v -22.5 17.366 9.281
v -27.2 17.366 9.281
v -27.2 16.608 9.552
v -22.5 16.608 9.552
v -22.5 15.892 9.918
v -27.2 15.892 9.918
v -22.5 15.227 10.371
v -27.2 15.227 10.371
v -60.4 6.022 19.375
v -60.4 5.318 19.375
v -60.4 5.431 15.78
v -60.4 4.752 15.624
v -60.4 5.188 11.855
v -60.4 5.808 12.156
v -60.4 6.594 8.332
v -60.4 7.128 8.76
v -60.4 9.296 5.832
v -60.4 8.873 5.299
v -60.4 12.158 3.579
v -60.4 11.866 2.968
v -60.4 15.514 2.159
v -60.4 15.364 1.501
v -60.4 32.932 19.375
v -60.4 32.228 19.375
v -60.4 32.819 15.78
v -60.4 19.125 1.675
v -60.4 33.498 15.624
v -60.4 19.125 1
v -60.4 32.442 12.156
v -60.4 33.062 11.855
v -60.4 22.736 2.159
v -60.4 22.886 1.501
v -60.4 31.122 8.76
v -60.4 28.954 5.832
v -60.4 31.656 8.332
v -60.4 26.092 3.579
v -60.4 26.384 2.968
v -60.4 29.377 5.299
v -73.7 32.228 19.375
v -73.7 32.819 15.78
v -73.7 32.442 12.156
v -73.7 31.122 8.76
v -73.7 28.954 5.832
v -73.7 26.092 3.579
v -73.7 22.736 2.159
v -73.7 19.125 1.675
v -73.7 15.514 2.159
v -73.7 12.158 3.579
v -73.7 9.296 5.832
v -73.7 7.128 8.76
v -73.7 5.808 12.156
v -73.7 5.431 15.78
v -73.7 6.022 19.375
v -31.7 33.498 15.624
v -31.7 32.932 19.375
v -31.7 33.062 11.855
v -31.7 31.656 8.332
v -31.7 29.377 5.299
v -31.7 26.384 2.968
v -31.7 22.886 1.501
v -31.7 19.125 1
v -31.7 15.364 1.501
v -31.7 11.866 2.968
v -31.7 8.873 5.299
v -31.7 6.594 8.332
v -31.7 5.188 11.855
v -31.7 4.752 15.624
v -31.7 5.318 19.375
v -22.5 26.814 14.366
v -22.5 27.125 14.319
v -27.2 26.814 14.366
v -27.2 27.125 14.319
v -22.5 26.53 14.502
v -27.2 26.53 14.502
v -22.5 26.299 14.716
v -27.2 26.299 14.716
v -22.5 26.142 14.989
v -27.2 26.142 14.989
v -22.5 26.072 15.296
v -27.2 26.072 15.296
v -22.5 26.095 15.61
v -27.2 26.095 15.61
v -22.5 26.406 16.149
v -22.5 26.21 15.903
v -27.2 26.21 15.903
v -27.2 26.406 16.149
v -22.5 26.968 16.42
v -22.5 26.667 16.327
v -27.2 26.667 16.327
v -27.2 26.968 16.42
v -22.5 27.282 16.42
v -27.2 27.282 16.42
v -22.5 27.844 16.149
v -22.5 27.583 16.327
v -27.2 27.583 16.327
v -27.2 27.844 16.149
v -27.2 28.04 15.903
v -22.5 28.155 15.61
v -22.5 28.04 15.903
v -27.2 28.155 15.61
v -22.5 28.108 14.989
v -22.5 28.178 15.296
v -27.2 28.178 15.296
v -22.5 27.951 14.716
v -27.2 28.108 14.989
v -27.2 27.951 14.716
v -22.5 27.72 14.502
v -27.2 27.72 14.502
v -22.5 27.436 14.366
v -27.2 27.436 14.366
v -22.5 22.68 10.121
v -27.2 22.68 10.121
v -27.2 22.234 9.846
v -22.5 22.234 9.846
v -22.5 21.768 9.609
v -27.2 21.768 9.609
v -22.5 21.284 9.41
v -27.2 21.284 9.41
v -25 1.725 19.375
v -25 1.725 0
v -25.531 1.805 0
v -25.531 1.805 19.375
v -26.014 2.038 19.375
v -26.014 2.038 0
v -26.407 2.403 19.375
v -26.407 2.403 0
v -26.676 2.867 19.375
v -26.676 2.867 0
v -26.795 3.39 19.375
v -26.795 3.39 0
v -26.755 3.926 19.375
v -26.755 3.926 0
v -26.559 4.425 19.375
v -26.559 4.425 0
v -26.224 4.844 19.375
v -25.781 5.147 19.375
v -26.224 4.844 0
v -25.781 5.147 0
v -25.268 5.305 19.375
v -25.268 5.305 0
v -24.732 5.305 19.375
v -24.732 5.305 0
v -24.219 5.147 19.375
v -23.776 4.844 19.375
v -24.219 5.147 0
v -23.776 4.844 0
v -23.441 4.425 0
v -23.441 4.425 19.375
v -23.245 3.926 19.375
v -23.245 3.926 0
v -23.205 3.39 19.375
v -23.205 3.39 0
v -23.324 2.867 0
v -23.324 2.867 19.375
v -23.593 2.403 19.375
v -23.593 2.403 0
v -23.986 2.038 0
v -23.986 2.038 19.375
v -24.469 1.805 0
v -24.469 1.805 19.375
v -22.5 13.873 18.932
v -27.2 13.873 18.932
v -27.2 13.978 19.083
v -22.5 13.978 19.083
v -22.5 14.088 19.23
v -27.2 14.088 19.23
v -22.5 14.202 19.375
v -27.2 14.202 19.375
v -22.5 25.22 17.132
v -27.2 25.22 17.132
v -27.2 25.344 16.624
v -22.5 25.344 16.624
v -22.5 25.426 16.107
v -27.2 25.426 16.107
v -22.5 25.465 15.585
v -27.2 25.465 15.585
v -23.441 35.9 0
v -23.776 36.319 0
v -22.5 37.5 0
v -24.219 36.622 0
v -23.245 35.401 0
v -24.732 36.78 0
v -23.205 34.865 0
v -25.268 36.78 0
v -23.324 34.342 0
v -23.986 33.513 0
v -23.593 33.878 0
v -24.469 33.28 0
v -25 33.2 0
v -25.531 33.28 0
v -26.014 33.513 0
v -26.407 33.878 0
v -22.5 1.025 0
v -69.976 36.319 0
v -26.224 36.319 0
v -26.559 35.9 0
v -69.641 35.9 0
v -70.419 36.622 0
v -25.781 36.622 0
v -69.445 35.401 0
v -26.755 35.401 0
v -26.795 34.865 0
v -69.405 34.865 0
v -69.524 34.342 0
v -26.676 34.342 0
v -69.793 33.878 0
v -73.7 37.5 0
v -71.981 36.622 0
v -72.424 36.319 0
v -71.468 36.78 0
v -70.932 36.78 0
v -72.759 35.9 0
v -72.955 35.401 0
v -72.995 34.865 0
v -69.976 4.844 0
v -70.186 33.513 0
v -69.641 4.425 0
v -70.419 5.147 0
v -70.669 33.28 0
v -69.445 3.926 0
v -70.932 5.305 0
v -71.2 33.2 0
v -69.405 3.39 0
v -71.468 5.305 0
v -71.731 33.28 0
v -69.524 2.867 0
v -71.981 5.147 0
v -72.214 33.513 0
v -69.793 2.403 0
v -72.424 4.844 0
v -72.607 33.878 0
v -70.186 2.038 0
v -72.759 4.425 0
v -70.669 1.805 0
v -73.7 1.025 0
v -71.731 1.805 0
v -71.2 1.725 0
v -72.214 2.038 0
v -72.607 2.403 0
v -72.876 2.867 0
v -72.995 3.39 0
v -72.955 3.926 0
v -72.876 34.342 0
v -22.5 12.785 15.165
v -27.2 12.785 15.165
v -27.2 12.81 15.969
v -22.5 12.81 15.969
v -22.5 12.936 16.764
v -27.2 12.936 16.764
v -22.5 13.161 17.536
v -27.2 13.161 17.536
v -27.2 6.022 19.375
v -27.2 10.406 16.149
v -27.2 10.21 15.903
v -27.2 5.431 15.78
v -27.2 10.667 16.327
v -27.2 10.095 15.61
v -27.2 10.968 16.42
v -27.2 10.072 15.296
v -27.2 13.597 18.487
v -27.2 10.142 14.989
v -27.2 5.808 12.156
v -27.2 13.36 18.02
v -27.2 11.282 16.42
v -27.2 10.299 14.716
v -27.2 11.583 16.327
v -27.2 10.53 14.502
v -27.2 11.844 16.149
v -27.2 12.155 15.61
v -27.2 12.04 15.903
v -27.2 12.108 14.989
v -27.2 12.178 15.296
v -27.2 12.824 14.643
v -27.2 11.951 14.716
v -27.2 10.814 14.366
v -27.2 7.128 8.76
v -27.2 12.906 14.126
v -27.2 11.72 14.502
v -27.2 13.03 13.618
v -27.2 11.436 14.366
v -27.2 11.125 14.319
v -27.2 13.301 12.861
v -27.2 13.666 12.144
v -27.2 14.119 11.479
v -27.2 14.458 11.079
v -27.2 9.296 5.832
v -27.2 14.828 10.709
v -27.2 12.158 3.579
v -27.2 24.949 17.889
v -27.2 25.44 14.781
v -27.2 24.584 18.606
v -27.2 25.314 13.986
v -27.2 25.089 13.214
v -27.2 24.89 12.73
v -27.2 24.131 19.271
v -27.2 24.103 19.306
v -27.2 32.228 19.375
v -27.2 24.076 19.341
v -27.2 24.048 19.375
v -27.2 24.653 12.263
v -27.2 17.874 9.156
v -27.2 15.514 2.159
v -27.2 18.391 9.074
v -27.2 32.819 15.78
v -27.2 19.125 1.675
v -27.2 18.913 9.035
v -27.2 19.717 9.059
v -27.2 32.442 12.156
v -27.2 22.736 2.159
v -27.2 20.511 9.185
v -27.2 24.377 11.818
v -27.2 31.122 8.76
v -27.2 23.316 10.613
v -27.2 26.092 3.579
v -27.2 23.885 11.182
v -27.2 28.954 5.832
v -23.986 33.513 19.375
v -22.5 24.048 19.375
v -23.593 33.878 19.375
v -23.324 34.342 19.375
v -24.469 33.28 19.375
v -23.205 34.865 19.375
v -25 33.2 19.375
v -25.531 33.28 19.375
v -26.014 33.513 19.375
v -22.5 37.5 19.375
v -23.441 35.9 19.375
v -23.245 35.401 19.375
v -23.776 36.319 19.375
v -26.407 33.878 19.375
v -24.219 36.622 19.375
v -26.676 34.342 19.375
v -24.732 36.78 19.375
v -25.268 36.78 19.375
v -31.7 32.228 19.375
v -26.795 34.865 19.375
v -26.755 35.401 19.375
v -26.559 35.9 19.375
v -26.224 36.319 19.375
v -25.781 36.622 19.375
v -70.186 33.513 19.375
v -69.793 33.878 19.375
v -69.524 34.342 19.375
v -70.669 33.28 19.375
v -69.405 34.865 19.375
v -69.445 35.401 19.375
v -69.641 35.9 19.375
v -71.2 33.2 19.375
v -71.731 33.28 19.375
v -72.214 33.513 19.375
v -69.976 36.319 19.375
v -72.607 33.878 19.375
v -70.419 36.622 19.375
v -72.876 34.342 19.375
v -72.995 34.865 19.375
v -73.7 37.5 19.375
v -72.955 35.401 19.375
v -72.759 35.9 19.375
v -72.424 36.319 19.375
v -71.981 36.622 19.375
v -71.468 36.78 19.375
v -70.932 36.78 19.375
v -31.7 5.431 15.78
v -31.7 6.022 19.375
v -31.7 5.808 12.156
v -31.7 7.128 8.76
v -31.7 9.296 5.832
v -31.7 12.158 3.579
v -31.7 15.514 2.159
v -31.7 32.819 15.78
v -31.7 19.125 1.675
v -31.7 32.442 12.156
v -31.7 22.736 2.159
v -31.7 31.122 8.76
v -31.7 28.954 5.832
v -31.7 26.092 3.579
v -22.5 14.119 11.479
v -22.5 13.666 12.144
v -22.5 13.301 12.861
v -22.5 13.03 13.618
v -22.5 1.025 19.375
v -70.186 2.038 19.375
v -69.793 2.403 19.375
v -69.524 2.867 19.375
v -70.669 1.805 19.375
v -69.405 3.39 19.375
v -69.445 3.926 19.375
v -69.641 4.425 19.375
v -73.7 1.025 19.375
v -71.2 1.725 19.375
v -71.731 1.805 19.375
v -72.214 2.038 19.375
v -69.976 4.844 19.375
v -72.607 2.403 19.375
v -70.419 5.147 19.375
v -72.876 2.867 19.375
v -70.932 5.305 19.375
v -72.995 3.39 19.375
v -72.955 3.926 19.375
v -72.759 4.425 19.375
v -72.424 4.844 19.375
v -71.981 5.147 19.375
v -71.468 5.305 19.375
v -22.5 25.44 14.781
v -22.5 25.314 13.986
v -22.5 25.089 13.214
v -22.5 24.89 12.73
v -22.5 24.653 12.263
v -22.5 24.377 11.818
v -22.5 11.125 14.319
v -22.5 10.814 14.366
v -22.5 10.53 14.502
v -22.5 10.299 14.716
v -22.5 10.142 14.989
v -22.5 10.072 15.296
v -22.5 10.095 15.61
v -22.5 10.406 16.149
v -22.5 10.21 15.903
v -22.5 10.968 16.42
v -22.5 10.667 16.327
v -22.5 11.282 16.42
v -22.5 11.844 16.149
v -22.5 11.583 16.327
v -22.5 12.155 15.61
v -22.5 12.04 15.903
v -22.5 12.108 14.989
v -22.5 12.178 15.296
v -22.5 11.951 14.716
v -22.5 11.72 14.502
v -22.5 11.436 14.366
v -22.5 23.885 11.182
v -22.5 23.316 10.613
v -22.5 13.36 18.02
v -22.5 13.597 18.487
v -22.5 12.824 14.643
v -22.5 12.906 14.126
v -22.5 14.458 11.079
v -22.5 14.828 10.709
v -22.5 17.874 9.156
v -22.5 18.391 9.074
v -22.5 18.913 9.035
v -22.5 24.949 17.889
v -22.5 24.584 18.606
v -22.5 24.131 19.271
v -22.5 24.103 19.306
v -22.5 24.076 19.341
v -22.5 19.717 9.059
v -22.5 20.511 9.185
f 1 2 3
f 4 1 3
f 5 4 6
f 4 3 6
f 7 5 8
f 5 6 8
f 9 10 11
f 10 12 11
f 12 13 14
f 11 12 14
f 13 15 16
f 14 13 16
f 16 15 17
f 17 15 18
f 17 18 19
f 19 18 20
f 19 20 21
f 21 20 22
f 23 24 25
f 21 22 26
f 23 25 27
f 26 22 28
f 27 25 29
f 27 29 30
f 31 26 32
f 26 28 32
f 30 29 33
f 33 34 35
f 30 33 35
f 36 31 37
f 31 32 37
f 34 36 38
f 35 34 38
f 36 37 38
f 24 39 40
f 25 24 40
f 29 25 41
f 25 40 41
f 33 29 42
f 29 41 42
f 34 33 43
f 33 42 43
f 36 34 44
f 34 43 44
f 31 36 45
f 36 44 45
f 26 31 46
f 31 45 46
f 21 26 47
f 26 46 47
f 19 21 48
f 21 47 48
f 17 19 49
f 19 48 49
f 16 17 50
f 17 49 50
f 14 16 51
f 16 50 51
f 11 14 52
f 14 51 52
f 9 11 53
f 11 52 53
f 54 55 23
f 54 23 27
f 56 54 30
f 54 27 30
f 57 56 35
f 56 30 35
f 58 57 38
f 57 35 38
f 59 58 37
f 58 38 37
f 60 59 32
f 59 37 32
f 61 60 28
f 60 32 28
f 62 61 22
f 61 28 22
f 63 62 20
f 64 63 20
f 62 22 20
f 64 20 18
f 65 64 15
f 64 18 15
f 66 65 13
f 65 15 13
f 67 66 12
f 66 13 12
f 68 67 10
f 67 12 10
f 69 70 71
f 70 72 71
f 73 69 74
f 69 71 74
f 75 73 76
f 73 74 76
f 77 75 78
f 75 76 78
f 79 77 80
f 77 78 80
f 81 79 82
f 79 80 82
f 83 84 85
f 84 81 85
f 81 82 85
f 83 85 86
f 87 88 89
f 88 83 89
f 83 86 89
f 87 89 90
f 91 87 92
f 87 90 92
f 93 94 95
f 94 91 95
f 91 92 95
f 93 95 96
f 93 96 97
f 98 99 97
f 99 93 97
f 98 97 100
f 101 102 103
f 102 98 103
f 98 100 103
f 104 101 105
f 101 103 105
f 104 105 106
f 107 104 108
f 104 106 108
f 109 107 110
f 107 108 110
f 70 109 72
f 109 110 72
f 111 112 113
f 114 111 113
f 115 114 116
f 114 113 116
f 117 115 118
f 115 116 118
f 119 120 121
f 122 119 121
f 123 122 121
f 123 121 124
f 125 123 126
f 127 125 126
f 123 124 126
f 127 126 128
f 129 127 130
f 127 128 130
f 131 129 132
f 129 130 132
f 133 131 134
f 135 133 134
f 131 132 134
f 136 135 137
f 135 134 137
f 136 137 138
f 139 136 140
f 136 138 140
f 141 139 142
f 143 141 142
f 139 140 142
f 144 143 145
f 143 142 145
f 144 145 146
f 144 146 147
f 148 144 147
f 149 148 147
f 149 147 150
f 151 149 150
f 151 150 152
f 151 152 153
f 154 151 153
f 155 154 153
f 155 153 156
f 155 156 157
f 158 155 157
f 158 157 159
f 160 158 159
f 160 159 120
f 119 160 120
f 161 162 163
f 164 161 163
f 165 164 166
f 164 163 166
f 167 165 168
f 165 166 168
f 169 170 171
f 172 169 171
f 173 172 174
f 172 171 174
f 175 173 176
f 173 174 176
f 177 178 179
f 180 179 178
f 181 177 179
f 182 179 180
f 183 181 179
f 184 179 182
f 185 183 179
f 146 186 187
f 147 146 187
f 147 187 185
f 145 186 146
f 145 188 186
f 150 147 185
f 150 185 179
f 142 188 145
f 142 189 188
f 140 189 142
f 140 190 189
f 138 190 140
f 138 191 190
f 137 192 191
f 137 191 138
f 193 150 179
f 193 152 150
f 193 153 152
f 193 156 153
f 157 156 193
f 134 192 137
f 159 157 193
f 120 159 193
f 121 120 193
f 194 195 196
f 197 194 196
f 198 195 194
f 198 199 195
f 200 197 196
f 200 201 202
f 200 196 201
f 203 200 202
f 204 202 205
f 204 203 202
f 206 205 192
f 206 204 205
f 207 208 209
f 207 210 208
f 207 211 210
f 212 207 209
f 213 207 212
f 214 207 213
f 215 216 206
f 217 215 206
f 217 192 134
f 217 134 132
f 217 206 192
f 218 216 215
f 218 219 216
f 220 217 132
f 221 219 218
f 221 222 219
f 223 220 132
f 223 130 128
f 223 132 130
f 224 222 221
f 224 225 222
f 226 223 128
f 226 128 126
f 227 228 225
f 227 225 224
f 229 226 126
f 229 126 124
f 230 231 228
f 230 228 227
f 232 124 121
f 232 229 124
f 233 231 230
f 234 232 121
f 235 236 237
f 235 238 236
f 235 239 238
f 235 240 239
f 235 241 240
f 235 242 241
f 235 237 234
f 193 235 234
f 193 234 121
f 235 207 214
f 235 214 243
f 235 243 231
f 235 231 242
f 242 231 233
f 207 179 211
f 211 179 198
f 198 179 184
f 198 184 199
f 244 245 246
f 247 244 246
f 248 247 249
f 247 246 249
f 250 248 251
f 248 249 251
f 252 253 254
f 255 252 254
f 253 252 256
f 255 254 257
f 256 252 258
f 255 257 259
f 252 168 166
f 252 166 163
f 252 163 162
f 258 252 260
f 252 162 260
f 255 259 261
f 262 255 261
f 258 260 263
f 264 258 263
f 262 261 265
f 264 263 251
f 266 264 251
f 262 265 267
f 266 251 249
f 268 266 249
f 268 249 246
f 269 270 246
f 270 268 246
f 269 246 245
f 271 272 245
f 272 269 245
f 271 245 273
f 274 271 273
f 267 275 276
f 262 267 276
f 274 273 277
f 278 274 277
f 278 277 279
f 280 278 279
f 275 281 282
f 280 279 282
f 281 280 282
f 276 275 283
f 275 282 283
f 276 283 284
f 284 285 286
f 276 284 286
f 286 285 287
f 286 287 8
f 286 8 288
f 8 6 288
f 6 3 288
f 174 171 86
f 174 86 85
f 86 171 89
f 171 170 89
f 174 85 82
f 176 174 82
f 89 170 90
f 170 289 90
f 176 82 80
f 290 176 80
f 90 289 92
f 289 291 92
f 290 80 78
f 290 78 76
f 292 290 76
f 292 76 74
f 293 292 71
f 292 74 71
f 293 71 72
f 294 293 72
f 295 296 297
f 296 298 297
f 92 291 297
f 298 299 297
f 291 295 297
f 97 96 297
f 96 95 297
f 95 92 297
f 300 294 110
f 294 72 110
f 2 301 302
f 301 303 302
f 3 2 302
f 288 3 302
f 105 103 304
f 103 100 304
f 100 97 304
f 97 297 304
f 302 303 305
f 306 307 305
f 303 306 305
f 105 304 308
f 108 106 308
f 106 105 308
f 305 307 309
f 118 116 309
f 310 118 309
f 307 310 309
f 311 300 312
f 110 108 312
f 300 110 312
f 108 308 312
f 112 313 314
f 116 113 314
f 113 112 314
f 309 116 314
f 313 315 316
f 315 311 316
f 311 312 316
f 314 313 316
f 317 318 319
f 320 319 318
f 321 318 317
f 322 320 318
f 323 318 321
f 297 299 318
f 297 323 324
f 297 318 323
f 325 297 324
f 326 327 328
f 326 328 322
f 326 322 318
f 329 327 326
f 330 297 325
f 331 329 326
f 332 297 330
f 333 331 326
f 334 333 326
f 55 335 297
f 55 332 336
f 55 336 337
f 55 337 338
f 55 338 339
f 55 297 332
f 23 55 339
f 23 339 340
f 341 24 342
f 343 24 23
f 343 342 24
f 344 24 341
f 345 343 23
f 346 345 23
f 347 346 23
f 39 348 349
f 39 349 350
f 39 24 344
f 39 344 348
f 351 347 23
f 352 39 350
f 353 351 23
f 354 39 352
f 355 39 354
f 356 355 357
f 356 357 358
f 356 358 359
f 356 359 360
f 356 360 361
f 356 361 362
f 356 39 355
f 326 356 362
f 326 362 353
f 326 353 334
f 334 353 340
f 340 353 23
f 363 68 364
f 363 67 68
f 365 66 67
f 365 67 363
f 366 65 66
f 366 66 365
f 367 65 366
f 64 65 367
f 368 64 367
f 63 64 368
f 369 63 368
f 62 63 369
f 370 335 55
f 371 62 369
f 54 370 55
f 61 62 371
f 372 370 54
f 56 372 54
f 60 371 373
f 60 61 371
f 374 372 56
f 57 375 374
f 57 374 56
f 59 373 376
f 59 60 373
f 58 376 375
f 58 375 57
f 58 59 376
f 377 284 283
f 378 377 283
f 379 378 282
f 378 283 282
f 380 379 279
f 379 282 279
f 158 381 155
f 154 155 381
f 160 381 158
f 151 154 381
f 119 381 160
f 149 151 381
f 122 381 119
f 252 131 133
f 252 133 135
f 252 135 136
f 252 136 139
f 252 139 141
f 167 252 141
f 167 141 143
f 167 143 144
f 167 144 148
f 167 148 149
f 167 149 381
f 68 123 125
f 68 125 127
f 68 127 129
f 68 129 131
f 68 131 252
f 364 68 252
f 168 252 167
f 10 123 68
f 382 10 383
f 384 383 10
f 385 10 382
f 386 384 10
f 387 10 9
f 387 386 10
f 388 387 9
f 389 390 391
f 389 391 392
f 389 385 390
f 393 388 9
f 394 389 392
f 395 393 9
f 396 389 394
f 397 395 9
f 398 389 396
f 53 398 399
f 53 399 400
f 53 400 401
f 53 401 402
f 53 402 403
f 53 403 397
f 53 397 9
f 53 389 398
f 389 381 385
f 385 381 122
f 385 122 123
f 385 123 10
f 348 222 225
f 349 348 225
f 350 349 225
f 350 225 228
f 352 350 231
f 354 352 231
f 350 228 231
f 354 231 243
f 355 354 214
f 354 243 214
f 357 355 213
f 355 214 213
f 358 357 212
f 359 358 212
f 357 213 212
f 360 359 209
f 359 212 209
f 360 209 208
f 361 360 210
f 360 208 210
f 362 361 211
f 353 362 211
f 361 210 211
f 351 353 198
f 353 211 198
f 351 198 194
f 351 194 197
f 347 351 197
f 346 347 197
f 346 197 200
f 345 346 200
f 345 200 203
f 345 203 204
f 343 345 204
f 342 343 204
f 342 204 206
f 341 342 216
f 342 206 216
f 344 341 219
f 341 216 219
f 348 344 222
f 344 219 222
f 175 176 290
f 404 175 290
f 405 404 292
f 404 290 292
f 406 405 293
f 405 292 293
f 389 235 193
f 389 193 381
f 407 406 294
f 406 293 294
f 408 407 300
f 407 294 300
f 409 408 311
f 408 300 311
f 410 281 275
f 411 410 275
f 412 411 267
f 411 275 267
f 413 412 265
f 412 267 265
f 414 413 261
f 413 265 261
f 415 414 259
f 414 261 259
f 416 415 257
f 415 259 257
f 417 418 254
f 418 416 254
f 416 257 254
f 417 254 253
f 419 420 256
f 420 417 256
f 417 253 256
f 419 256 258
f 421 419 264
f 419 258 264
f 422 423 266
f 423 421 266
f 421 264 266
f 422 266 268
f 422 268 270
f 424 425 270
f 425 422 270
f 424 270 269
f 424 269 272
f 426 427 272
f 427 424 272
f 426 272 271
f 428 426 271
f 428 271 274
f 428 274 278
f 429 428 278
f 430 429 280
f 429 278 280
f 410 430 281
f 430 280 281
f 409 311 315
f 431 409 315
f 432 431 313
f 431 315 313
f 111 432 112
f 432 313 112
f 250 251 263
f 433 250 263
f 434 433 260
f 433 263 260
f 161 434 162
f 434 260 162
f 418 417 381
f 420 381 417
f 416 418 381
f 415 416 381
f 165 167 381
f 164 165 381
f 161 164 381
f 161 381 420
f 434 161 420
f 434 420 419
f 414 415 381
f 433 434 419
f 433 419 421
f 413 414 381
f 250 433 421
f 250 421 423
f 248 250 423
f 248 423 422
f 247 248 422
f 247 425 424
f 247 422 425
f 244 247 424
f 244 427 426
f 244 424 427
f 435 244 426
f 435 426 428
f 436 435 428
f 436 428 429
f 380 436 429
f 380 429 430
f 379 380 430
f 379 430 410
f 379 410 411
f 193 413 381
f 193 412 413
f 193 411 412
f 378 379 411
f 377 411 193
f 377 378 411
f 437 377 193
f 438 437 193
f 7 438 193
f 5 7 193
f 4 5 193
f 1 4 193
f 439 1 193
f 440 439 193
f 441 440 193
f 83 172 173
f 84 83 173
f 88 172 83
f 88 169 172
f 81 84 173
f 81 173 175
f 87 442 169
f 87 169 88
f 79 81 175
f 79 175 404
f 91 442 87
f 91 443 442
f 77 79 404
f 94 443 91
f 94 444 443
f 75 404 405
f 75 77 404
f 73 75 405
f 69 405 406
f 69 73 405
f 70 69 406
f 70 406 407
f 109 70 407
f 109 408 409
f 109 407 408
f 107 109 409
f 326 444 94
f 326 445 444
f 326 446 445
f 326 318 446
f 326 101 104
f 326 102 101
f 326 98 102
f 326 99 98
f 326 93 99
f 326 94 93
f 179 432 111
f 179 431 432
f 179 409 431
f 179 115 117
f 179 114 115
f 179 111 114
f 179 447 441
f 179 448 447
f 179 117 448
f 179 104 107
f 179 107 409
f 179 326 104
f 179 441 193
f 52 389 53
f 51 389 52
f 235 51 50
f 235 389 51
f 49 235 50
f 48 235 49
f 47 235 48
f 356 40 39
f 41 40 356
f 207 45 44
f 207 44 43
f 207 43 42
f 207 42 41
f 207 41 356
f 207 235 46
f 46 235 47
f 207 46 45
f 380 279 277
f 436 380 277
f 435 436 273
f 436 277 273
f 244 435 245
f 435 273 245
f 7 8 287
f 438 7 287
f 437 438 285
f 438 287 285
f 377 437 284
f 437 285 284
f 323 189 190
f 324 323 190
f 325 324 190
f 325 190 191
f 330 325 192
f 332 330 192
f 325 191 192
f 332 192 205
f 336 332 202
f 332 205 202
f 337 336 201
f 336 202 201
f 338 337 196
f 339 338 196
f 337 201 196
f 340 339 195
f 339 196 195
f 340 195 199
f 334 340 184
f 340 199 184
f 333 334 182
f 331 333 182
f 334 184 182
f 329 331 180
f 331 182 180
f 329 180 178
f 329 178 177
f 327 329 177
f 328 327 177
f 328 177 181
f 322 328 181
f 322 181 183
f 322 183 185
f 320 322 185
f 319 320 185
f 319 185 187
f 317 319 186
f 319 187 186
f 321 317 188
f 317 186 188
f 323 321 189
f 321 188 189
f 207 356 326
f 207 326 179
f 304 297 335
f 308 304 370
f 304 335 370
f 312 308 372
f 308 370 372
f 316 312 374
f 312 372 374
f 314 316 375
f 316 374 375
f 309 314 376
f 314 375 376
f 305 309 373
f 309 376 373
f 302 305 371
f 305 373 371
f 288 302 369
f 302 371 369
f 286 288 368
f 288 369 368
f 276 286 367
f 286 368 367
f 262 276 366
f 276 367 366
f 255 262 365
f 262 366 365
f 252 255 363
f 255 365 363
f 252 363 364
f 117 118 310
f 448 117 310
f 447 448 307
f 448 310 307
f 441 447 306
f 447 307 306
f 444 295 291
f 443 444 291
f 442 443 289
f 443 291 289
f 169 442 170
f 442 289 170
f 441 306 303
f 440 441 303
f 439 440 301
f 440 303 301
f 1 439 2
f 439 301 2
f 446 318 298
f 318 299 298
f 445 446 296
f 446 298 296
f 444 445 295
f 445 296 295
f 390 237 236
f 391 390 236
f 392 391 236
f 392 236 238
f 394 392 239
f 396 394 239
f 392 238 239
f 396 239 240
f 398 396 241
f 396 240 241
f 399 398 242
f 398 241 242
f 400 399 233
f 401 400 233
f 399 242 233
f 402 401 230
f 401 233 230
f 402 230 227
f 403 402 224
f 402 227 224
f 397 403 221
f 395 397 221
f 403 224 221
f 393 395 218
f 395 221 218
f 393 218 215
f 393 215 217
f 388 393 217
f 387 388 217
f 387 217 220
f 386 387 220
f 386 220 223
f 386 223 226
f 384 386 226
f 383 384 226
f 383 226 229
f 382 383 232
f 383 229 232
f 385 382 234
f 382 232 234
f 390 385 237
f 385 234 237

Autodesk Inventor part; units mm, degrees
ref_plane "YZ Plane" through (0, 0, 0) normal (1, 0, 0) x (0, 1, 0)
ref_plane "Work Plane1" through (-73.7, 19.125, 15.375) normal (-1, 0, 0) x (0, 1, 0)
sketch "Sketch1" plane through (-73.7, 19.125, 15.375) normal (-1, 0, 0) x (0, 1, 0)
  line L0 (18.375, 18.375) -> (-92.625, 18.375) projected
  line L1 (-92.625, 18.375) -> (-92.625, 15.375) projected
  line L2 (18.375, 15.375) -> (-92.625, 15.375) projected
  line L3 (18.375, 18.375) -> (18.375, 15.375) projected
  line L4 (11, 1.5) -> (11.5, 1.5) projected
  line L5 (11.5, 1.5) -> (11.5, -1.5) projected
  line L6 (11.5, -1.5) -> (11, -1.5) projected
  line L7 (11, -1.5) -> (11, 1.5) projected
  line L8 (-11.5, -1.5) -> (-12, -1.5) projected
  line L9 (-12, -1.5) -> (-12, 1.5) projected
  line L10 (-12, 1.5) -> (-11.5, 1.5) projected
  line L11 (-11.5, 1.5) -> (-11.5, -1.5) projected
  circle A0 centre (0, 0) radius 5 projected
  circle A1 centre (0, 0) radius 13.7 projected
  line L12 (18.375, 15.375) -> (-18.1, 15.375)
  line L13 (-18.1, 15.375) -> (-18.1, -4)
  line L14 (-18.1, -4) -> (18.375, -4)
  line L15 (18.375, -4) -> (18.375, 15.375)
  point P0 (-19.125, 15.375)
  point P1 (-13.7, 0)
  point P2 (13.7, 0)
  point P3 (-18.1, 15.375)
  point P4 (-13.1031, -4)
  point P5 (13.1031, -4)
  dimension "d0" = 4
  dimension "d2" = 15.375
  dimension "d3" = 15.375
  dimension "d4" = 4.675
  dimension "d5" = 4.4
ref_plane "Work Plane2" through (-27.2, 5.425, 1.675) normal (1, 0, 0) x (0, 1, 0)
extrude "Extrusion1" add sketch "Sketch1" against normal up to surface (46.5 mm away) contours L15 L14 A1 L13 L2
sketch "Sketch2" plane through (-27.2, 19.125, 15.375) normal (1, 0, 0) x (0, 0, -1)
  circle A0 centre (0, -8) radius 1.0564 projected
  circle A1 centre (0, 8) radius 1.0564 projected
  circle A2 centre (0, 0) radius 5 projected
  circle A3 centre (0, 0) radius 13.7 projected
  line L0 (18.375, 18.375) -> (18.375, -91.625) projected
  arc A4 (1.3629, -5.6821) -> (1.478, -3.5703) centre (-3.2424, -4.3721) ccw projected
  arc A5 (1.478, -3.5703) -> (2.0183, -3.2951) centre (0, 0) ccw projected
  arc A6 (2.0183, -3.2951) -> (3.794, -4.444) centre (5.443, 0.0511) ccw projected
  arc A7 (3.794, -4.444) -> (4.4425, -3.7958) centre (0, 0) ccw projected
  arc A8 (4.4425, -3.7958) -> (3.2943, -2.0197) centre (-0.0533, -5.443) ccw projected
  arc A9 (3.2943, -2.0197) -> (3.5697, -1.4795) centre (0, 0) ccw projected
  arc A10 (3.5697, -1.4795) -> (5.6815, -1.3652) centre (4.3734, 3.2407) ccw projected
  arc A11 (5.6815, -1.3652) -> (5.8252, -0.4596) centre (0, 0) ccw projected
  arc A12 (5.8252, -0.4596) -> (3.8523, 0.3024) centre (3.1561, -4.4348) ccw projected
  arc A13 (3.8523, 0.3024) -> (3.7575, 0.9013) centre (0, 0) ccw projected
  arc A14 (3.7575, 0.9013) -> (5.3989, 2.235) centre (1.6334, 5.1924) ccw projected
  arc A15 (5.3989, 2.235) -> (4.9828, 3.0521) centre (0, 0) ccw projected
  arc A16 (4.9828, 3.0521) -> (2.9388, 2.5089) centre (5.1601, -1.7327) ccw projected
  arc A17 (2.9388, 2.5089) -> (2.5101, 2.9378) centre (0, 0) ccw projected
  arc A18 (2.5101, 2.9378) -> (3.0541, 4.9816) centre (-1.7306, 5.1608) ccw projected
  arc A19 (3.0541, 4.9816) -> (2.2372, 5.398) centre (0, 0) ccw projected
  arc A20 (2.2372, 5.398) -> (0.9028, 3.7572) centre (5.193, 1.6313) ccw projected
  arc A21 (0.9028, 3.7572) -> (0.304, 3.8521) centre (0, 0) ccw projected
  arc A22 (0.304, 3.8521) -> (-0.4573, 5.8253) centre (-4.4335, 3.1579) ccw projected
  arc A23 (-0.4573, 5.8253) -> (-1.3629, 5.6821) centre (0, 0) ccw projected
  arc A24 (-1.3629, 5.6821) -> (-1.478, 3.5703) centre (3.2424, 4.3721) ccw projected
  arc A25 (-1.478, 3.5703) -> (-2.0183, 3.2951) centre (0, 0) ccw projected
  arc A26 (-2.0183, 3.2951) -> (-3.794, 4.444) centre (-5.443, -0.0511) ccw projected
  arc A27 (-3.794, 4.444) -> (-4.4425, 3.7958) centre (0, 0) ccw projected
  arc A28 (-4.4425, 3.7958) -> (-3.2943, 2.0197) centre (0.0533, 5.443) ccw projected
  arc A29 (-3.2943, 2.0197) -> (-3.5697, 1.4795) centre (0, 0) ccw projected
  arc A30 (-3.5697, 1.4795) -> (-5.6815, 1.3652) centre (-4.3734, -3.2407) ccw projected
  arc A31 (-5.6815, 1.3652) -> (-5.8252, 0.4596) centre (0, 0) ccw projected
  arc A32 (-5.8252, 0.4596) -> (-3.8523, -0.3024) centre (-3.1561, 4.4348) ccw projected
  arc A33 (-3.8523, -0.3024) -> (-3.7575, -0.9013) centre (0, 0) ccw projected
  arc A34 (-3.7575, -0.9013) -> (-5.3989, -2.235) centre (-1.6334, -5.1924) ccw projected
  arc A35 (-5.3989, -2.235) -> (-4.9828, -3.0521) centre (0, 0) ccw projected
  arc A36 (-4.9828, -3.0521) -> (-2.9388, -2.5089) centre (-5.1601, 1.7327) ccw projected
  arc A37 (-2.9388, -2.5089) -> (-2.5101, -2.9378) centre (0, 0) ccw projected
  arc A38 (-2.5101, -2.9378) -> (-3.0541, -4.9816) centre (1.7306, -5.1608) ccw projected
  arc A39 (-3.0541, -4.9816) -> (-2.2372, -5.398) centre (0, 0) ccw projected
  arc A40 (-2.2372, -5.398) -> (-0.9028, -3.7572) centre (-5.193, -1.6313) ccw projected
  arc A41 (-0.9028, -3.7572) -> (-0.304, -3.8521) centre (0, 0) ccw projected
  arc A42 (-0.304, -3.8521) -> (0.4573, -5.8253) centre (4.4335, -3.1579) ccw projected
  arc A43 (0.4573, -5.8253) -> (1.3629, -5.6821) centre (0, 0) ccw projected
  line L1 (15.375, -18.1) -> (-4, -18.1) projected
  line L2 (15.375, 18.375) -> (15.375, -18.1) projected
  line L3 (-4, 18.375) -> (15.375, 18.375) projected
  line L4 (-4, 13.1031) -> (-4, 18.375) projected
  arc A44 (-4, -13.1031) -> (-4, 13.1031) centre (0, 0) ccw projected
  line L5 (-4, -18.1) -> (-4, -13.1031) projected
  line L6 (-4, -18.1) -> (-4, -13.1031) projected
  line L7 (15.375, 18.375) -> (15.375, -18.1) projected
  line L8 (-4, -18.1) -> (15.375, -18.1)
  line L9 (15.375, -18.1) -> (15.375, 18.375)
  line L10 (15.375, 18.375) -> (-4, 18.375)
  line L11 (-4, 18.375) -> (-4, -18.1)
  circle A45 centre (0, -8) radius 1.0564
  circle A46 centre (0, 8) radius 1.0564
  arc A47 (6.0944, -1.7595) -> (6.3397, -0.2124) centre (0, 0) ccw
  arc A48 (3.9887, -2.0334) -> (6.0944, -1.7595) centre (4.3734, 3.2407) ccw
  arc A49 (5.0041, -3.8982) -> (3.9887, -2.0334) centre (-0.0533, -5.443) ccw
  arc A50 (3.8962, -5.0057) -> (5.0041, -3.8982) centre (0, 0) ccw
  arc A51 (2.0318, -3.9896) -> (3.8962, -5.0057) centre (5.443, 0.0511) ccw
  arc A52 (1.7571, -6.0951) -> (2.0318, -3.9896) centre (-3.2424, -4.3721) ccw
  arc A53 (0.2098, -6.3398) -> (1.7571, -6.0951) centre (0, 0) ccw
  arc A54 (-0.7013, -4.4219) -> (0.2098, -6.3398) centre (4.4335, -3.1579) ccw
  arc A55 (-2.1611, -5.9638) -> (-0.7013, -4.4219) centre (-5.193, -1.6313) ccw
  arc A56 (-3.5567, -5.2523) -> (-2.1611, -5.9638) centre (0, 0) ccw
  arc A57 (-3.1665, -3.1652) -> (-3.5567, -5.2523) centre (1.7306, -5.1608) ccw
  arc A58 (-5.2538, -3.5545) -> (-3.1665, -3.1652) centre (-5.1601, 1.7327) ccw
  arc A59 (-5.9647, -2.1587) -> (-5.2538, -3.5545) centre (0, 0) ccw
  arc A60 (-4.4222, -0.6995) -> (-5.9647, -2.1587) centre (-1.6334, -5.1924) ccw
  arc A61 (-6.3397, 0.2124) -> (-4.4222, -0.6995) centre (-3.1561, 4.4348) ccw
  arc A62 (-6.0944, 1.7595) -> (-6.3397, 0.2124) centre (0, 0) ccw
  arc A63 (-3.9887, 2.0334) -> (-6.0944, 1.7595) centre (-4.3734, -3.2407) ccw
  arc A64 (-5.0041, 3.8982) -> (-3.9887, 2.0334) centre (0.0533, 5.443) ccw
  arc A65 (-3.8962, 5.0057) -> (-5.0041, 3.8982) centre (0, 0) ccw
  arc A66 (-2.0318, 3.9896) -> (-3.8962, 5.0057) centre (-5.443, -0.0511) ccw
  arc A67 (-1.7571, 6.0951) -> (-2.0318, 3.9896) centre (3.2424, 4.3721) ccw
  arc A68 (-0.2098, 6.3398) -> (-1.7571, 6.0951) centre (0, 0) ccw
  arc A69 (0.7013, 4.4219) -> (-0.2098, 6.3398) centre (-4.4335, 3.1579) ccw
  arc A70 (2.1611, 5.9638) -> (0.7013, 4.4219) centre (5.193, 1.6313) ccw
  arc A71 (3.5567, 5.2523) -> (2.1611, 5.9638) centre (0, 0) ccw
  arc A72 (3.1665, 3.1652) -> (3.5567, 5.2523) centre (-1.7306, 5.1608) ccw
  arc A73 (5.2538, 3.5545) -> (3.1665, 3.1652) centre (5.1601, -1.7327) ccw
  arc A74 (5.9647, 2.1587) -> (5.2538, 3.5545) centre (0, 0) ccw
  arc A75 (4.4222, 0.6995) -> (5.9647, 2.1587) centre (1.6334, 5.1924) ccw
  arc A76 (6.3397, -0.2124) -> (4.4222, 0.6995) centre (3.1561, -4.4348) ccw
  circle A77 centre (0, 0) radius 6.3433
  point P0 (15.375, -19.125)
  point P1 (-4, 13.1031)
  point P2 (-4, 4.9231)
  point P3 (-3.8962, 5.0057)
  point P4 (-1.7571, 6.0951)
  point P5 (-0.2098, 6.3398)
  point P6 (2.1611, 5.9638)
  point P7 (3.5567, 5.2523)
  point P8 (5.2538, 3.5545)
  point P9 (5.9647, 2.1587)
  point P10 (6.3397, -0.2124)
  point P11 (5.0041, -3.8982)
  point P12 (3.8962, -5.0057)
  point P13 (1.7571, -6.0951)
  point P14 (0.2098, -6.3398)
  point P15 (-2.1611, -5.9638)
  point P16 (-3.5567, -5.2523)
  point P17 (-4, -4.9231)
  dimension "d8" = 0.5
ref_plane "Work Plane3" through (-22.5, 37.5, -3) normal (-1, 0, 0) x (0, 0, 1)
extrude "Extrusion2" add sketch "Sketch2" along normal up to surface (4.7 mm away) contours A77 A74 A71 A68 A65 L11 A3 A56 A53 A50 A47 | L4 L3 L2 L1 L5 A3
sketch "Sketch3" plane through (-73.7, 32.2281, 19.375) normal (0, 0, 1) x (1, 0, 0)
  line L0 (0, 5.2719) -> (51.2, 5.2719) projected
  line L1 (0, 0) -> (0, 5.2719) projected
  line L2 (0, 0) -> (46.5, 0) projected
  line L3 (46.5, 0) -> (46.5, -8.1799) projected
  line L4 (46.5, -8.1799) -> (51.2, -8.1799) projected
  line L5 (51.2, 5.2719) -> (51.2, -8.1799) projected
  line L6 (0, -26.2061) -> (46.5, -26.2061) projected
  line L7 (0, -31.2031) -> (0, -26.2061) projected
  line L8 (0, -31.2031) -> (51.2, -31.2031) projected
  line L9 (51.2, -18.0262) -> (51.2, -31.2031) projected
  line L10 (46.5, -18.0262) -> (51.2, -18.0262) projected
  line L11 (46.5, -18.0262) -> (46.5, -26.2061) projected
  line L12 (2.5, 2.7719) -> (48.7, 2.7719)
  line L13 (48.7, 2.7719) -> (48.7, -28.7031)
  line L14 (48.7, -28.7031) -> (2.5, -28.7031)
  line L15 (2.5, -28.7031) -> (2.5, 2.7719)
  point P0 (73.7, -32.2281)
  dimension "d11" = 2.5
  dimension "d12" = 2.5
  dimension "d13" = 2.5
  dimension "d14" = 2.5
hole "Hole1" at (-71.2, 3.525, 19.375) at (-71.2, 35, 19.375) at (-25, 35, 19.375) at (-25, 3.525, 19.375) direction (0, 0, -1) diameter 3.6 end through all counterbore diameter 11 counterbore depth 0 clearance for "Hex Head Cap Screw ISO 24017" size "M3" standard "ISO"
ref_plane "Work Plane4" through (-60.4, 19.125, 15.375) normal (-1, 0, 0) x (0, 1, 0)
sketch "Sketch4" plane through (-60.4, 19.125, 15.375) normal (-1, 0, 0) x (0, 1, 0)
  circle A0 centre (0, 0) radius 14.375 projected
  point P0 (-19.125, 15.375)
extrude "Extrusion3" cut sketch "Sketch4" against normal blind 28.7
properties part number "motor_mount_right"
